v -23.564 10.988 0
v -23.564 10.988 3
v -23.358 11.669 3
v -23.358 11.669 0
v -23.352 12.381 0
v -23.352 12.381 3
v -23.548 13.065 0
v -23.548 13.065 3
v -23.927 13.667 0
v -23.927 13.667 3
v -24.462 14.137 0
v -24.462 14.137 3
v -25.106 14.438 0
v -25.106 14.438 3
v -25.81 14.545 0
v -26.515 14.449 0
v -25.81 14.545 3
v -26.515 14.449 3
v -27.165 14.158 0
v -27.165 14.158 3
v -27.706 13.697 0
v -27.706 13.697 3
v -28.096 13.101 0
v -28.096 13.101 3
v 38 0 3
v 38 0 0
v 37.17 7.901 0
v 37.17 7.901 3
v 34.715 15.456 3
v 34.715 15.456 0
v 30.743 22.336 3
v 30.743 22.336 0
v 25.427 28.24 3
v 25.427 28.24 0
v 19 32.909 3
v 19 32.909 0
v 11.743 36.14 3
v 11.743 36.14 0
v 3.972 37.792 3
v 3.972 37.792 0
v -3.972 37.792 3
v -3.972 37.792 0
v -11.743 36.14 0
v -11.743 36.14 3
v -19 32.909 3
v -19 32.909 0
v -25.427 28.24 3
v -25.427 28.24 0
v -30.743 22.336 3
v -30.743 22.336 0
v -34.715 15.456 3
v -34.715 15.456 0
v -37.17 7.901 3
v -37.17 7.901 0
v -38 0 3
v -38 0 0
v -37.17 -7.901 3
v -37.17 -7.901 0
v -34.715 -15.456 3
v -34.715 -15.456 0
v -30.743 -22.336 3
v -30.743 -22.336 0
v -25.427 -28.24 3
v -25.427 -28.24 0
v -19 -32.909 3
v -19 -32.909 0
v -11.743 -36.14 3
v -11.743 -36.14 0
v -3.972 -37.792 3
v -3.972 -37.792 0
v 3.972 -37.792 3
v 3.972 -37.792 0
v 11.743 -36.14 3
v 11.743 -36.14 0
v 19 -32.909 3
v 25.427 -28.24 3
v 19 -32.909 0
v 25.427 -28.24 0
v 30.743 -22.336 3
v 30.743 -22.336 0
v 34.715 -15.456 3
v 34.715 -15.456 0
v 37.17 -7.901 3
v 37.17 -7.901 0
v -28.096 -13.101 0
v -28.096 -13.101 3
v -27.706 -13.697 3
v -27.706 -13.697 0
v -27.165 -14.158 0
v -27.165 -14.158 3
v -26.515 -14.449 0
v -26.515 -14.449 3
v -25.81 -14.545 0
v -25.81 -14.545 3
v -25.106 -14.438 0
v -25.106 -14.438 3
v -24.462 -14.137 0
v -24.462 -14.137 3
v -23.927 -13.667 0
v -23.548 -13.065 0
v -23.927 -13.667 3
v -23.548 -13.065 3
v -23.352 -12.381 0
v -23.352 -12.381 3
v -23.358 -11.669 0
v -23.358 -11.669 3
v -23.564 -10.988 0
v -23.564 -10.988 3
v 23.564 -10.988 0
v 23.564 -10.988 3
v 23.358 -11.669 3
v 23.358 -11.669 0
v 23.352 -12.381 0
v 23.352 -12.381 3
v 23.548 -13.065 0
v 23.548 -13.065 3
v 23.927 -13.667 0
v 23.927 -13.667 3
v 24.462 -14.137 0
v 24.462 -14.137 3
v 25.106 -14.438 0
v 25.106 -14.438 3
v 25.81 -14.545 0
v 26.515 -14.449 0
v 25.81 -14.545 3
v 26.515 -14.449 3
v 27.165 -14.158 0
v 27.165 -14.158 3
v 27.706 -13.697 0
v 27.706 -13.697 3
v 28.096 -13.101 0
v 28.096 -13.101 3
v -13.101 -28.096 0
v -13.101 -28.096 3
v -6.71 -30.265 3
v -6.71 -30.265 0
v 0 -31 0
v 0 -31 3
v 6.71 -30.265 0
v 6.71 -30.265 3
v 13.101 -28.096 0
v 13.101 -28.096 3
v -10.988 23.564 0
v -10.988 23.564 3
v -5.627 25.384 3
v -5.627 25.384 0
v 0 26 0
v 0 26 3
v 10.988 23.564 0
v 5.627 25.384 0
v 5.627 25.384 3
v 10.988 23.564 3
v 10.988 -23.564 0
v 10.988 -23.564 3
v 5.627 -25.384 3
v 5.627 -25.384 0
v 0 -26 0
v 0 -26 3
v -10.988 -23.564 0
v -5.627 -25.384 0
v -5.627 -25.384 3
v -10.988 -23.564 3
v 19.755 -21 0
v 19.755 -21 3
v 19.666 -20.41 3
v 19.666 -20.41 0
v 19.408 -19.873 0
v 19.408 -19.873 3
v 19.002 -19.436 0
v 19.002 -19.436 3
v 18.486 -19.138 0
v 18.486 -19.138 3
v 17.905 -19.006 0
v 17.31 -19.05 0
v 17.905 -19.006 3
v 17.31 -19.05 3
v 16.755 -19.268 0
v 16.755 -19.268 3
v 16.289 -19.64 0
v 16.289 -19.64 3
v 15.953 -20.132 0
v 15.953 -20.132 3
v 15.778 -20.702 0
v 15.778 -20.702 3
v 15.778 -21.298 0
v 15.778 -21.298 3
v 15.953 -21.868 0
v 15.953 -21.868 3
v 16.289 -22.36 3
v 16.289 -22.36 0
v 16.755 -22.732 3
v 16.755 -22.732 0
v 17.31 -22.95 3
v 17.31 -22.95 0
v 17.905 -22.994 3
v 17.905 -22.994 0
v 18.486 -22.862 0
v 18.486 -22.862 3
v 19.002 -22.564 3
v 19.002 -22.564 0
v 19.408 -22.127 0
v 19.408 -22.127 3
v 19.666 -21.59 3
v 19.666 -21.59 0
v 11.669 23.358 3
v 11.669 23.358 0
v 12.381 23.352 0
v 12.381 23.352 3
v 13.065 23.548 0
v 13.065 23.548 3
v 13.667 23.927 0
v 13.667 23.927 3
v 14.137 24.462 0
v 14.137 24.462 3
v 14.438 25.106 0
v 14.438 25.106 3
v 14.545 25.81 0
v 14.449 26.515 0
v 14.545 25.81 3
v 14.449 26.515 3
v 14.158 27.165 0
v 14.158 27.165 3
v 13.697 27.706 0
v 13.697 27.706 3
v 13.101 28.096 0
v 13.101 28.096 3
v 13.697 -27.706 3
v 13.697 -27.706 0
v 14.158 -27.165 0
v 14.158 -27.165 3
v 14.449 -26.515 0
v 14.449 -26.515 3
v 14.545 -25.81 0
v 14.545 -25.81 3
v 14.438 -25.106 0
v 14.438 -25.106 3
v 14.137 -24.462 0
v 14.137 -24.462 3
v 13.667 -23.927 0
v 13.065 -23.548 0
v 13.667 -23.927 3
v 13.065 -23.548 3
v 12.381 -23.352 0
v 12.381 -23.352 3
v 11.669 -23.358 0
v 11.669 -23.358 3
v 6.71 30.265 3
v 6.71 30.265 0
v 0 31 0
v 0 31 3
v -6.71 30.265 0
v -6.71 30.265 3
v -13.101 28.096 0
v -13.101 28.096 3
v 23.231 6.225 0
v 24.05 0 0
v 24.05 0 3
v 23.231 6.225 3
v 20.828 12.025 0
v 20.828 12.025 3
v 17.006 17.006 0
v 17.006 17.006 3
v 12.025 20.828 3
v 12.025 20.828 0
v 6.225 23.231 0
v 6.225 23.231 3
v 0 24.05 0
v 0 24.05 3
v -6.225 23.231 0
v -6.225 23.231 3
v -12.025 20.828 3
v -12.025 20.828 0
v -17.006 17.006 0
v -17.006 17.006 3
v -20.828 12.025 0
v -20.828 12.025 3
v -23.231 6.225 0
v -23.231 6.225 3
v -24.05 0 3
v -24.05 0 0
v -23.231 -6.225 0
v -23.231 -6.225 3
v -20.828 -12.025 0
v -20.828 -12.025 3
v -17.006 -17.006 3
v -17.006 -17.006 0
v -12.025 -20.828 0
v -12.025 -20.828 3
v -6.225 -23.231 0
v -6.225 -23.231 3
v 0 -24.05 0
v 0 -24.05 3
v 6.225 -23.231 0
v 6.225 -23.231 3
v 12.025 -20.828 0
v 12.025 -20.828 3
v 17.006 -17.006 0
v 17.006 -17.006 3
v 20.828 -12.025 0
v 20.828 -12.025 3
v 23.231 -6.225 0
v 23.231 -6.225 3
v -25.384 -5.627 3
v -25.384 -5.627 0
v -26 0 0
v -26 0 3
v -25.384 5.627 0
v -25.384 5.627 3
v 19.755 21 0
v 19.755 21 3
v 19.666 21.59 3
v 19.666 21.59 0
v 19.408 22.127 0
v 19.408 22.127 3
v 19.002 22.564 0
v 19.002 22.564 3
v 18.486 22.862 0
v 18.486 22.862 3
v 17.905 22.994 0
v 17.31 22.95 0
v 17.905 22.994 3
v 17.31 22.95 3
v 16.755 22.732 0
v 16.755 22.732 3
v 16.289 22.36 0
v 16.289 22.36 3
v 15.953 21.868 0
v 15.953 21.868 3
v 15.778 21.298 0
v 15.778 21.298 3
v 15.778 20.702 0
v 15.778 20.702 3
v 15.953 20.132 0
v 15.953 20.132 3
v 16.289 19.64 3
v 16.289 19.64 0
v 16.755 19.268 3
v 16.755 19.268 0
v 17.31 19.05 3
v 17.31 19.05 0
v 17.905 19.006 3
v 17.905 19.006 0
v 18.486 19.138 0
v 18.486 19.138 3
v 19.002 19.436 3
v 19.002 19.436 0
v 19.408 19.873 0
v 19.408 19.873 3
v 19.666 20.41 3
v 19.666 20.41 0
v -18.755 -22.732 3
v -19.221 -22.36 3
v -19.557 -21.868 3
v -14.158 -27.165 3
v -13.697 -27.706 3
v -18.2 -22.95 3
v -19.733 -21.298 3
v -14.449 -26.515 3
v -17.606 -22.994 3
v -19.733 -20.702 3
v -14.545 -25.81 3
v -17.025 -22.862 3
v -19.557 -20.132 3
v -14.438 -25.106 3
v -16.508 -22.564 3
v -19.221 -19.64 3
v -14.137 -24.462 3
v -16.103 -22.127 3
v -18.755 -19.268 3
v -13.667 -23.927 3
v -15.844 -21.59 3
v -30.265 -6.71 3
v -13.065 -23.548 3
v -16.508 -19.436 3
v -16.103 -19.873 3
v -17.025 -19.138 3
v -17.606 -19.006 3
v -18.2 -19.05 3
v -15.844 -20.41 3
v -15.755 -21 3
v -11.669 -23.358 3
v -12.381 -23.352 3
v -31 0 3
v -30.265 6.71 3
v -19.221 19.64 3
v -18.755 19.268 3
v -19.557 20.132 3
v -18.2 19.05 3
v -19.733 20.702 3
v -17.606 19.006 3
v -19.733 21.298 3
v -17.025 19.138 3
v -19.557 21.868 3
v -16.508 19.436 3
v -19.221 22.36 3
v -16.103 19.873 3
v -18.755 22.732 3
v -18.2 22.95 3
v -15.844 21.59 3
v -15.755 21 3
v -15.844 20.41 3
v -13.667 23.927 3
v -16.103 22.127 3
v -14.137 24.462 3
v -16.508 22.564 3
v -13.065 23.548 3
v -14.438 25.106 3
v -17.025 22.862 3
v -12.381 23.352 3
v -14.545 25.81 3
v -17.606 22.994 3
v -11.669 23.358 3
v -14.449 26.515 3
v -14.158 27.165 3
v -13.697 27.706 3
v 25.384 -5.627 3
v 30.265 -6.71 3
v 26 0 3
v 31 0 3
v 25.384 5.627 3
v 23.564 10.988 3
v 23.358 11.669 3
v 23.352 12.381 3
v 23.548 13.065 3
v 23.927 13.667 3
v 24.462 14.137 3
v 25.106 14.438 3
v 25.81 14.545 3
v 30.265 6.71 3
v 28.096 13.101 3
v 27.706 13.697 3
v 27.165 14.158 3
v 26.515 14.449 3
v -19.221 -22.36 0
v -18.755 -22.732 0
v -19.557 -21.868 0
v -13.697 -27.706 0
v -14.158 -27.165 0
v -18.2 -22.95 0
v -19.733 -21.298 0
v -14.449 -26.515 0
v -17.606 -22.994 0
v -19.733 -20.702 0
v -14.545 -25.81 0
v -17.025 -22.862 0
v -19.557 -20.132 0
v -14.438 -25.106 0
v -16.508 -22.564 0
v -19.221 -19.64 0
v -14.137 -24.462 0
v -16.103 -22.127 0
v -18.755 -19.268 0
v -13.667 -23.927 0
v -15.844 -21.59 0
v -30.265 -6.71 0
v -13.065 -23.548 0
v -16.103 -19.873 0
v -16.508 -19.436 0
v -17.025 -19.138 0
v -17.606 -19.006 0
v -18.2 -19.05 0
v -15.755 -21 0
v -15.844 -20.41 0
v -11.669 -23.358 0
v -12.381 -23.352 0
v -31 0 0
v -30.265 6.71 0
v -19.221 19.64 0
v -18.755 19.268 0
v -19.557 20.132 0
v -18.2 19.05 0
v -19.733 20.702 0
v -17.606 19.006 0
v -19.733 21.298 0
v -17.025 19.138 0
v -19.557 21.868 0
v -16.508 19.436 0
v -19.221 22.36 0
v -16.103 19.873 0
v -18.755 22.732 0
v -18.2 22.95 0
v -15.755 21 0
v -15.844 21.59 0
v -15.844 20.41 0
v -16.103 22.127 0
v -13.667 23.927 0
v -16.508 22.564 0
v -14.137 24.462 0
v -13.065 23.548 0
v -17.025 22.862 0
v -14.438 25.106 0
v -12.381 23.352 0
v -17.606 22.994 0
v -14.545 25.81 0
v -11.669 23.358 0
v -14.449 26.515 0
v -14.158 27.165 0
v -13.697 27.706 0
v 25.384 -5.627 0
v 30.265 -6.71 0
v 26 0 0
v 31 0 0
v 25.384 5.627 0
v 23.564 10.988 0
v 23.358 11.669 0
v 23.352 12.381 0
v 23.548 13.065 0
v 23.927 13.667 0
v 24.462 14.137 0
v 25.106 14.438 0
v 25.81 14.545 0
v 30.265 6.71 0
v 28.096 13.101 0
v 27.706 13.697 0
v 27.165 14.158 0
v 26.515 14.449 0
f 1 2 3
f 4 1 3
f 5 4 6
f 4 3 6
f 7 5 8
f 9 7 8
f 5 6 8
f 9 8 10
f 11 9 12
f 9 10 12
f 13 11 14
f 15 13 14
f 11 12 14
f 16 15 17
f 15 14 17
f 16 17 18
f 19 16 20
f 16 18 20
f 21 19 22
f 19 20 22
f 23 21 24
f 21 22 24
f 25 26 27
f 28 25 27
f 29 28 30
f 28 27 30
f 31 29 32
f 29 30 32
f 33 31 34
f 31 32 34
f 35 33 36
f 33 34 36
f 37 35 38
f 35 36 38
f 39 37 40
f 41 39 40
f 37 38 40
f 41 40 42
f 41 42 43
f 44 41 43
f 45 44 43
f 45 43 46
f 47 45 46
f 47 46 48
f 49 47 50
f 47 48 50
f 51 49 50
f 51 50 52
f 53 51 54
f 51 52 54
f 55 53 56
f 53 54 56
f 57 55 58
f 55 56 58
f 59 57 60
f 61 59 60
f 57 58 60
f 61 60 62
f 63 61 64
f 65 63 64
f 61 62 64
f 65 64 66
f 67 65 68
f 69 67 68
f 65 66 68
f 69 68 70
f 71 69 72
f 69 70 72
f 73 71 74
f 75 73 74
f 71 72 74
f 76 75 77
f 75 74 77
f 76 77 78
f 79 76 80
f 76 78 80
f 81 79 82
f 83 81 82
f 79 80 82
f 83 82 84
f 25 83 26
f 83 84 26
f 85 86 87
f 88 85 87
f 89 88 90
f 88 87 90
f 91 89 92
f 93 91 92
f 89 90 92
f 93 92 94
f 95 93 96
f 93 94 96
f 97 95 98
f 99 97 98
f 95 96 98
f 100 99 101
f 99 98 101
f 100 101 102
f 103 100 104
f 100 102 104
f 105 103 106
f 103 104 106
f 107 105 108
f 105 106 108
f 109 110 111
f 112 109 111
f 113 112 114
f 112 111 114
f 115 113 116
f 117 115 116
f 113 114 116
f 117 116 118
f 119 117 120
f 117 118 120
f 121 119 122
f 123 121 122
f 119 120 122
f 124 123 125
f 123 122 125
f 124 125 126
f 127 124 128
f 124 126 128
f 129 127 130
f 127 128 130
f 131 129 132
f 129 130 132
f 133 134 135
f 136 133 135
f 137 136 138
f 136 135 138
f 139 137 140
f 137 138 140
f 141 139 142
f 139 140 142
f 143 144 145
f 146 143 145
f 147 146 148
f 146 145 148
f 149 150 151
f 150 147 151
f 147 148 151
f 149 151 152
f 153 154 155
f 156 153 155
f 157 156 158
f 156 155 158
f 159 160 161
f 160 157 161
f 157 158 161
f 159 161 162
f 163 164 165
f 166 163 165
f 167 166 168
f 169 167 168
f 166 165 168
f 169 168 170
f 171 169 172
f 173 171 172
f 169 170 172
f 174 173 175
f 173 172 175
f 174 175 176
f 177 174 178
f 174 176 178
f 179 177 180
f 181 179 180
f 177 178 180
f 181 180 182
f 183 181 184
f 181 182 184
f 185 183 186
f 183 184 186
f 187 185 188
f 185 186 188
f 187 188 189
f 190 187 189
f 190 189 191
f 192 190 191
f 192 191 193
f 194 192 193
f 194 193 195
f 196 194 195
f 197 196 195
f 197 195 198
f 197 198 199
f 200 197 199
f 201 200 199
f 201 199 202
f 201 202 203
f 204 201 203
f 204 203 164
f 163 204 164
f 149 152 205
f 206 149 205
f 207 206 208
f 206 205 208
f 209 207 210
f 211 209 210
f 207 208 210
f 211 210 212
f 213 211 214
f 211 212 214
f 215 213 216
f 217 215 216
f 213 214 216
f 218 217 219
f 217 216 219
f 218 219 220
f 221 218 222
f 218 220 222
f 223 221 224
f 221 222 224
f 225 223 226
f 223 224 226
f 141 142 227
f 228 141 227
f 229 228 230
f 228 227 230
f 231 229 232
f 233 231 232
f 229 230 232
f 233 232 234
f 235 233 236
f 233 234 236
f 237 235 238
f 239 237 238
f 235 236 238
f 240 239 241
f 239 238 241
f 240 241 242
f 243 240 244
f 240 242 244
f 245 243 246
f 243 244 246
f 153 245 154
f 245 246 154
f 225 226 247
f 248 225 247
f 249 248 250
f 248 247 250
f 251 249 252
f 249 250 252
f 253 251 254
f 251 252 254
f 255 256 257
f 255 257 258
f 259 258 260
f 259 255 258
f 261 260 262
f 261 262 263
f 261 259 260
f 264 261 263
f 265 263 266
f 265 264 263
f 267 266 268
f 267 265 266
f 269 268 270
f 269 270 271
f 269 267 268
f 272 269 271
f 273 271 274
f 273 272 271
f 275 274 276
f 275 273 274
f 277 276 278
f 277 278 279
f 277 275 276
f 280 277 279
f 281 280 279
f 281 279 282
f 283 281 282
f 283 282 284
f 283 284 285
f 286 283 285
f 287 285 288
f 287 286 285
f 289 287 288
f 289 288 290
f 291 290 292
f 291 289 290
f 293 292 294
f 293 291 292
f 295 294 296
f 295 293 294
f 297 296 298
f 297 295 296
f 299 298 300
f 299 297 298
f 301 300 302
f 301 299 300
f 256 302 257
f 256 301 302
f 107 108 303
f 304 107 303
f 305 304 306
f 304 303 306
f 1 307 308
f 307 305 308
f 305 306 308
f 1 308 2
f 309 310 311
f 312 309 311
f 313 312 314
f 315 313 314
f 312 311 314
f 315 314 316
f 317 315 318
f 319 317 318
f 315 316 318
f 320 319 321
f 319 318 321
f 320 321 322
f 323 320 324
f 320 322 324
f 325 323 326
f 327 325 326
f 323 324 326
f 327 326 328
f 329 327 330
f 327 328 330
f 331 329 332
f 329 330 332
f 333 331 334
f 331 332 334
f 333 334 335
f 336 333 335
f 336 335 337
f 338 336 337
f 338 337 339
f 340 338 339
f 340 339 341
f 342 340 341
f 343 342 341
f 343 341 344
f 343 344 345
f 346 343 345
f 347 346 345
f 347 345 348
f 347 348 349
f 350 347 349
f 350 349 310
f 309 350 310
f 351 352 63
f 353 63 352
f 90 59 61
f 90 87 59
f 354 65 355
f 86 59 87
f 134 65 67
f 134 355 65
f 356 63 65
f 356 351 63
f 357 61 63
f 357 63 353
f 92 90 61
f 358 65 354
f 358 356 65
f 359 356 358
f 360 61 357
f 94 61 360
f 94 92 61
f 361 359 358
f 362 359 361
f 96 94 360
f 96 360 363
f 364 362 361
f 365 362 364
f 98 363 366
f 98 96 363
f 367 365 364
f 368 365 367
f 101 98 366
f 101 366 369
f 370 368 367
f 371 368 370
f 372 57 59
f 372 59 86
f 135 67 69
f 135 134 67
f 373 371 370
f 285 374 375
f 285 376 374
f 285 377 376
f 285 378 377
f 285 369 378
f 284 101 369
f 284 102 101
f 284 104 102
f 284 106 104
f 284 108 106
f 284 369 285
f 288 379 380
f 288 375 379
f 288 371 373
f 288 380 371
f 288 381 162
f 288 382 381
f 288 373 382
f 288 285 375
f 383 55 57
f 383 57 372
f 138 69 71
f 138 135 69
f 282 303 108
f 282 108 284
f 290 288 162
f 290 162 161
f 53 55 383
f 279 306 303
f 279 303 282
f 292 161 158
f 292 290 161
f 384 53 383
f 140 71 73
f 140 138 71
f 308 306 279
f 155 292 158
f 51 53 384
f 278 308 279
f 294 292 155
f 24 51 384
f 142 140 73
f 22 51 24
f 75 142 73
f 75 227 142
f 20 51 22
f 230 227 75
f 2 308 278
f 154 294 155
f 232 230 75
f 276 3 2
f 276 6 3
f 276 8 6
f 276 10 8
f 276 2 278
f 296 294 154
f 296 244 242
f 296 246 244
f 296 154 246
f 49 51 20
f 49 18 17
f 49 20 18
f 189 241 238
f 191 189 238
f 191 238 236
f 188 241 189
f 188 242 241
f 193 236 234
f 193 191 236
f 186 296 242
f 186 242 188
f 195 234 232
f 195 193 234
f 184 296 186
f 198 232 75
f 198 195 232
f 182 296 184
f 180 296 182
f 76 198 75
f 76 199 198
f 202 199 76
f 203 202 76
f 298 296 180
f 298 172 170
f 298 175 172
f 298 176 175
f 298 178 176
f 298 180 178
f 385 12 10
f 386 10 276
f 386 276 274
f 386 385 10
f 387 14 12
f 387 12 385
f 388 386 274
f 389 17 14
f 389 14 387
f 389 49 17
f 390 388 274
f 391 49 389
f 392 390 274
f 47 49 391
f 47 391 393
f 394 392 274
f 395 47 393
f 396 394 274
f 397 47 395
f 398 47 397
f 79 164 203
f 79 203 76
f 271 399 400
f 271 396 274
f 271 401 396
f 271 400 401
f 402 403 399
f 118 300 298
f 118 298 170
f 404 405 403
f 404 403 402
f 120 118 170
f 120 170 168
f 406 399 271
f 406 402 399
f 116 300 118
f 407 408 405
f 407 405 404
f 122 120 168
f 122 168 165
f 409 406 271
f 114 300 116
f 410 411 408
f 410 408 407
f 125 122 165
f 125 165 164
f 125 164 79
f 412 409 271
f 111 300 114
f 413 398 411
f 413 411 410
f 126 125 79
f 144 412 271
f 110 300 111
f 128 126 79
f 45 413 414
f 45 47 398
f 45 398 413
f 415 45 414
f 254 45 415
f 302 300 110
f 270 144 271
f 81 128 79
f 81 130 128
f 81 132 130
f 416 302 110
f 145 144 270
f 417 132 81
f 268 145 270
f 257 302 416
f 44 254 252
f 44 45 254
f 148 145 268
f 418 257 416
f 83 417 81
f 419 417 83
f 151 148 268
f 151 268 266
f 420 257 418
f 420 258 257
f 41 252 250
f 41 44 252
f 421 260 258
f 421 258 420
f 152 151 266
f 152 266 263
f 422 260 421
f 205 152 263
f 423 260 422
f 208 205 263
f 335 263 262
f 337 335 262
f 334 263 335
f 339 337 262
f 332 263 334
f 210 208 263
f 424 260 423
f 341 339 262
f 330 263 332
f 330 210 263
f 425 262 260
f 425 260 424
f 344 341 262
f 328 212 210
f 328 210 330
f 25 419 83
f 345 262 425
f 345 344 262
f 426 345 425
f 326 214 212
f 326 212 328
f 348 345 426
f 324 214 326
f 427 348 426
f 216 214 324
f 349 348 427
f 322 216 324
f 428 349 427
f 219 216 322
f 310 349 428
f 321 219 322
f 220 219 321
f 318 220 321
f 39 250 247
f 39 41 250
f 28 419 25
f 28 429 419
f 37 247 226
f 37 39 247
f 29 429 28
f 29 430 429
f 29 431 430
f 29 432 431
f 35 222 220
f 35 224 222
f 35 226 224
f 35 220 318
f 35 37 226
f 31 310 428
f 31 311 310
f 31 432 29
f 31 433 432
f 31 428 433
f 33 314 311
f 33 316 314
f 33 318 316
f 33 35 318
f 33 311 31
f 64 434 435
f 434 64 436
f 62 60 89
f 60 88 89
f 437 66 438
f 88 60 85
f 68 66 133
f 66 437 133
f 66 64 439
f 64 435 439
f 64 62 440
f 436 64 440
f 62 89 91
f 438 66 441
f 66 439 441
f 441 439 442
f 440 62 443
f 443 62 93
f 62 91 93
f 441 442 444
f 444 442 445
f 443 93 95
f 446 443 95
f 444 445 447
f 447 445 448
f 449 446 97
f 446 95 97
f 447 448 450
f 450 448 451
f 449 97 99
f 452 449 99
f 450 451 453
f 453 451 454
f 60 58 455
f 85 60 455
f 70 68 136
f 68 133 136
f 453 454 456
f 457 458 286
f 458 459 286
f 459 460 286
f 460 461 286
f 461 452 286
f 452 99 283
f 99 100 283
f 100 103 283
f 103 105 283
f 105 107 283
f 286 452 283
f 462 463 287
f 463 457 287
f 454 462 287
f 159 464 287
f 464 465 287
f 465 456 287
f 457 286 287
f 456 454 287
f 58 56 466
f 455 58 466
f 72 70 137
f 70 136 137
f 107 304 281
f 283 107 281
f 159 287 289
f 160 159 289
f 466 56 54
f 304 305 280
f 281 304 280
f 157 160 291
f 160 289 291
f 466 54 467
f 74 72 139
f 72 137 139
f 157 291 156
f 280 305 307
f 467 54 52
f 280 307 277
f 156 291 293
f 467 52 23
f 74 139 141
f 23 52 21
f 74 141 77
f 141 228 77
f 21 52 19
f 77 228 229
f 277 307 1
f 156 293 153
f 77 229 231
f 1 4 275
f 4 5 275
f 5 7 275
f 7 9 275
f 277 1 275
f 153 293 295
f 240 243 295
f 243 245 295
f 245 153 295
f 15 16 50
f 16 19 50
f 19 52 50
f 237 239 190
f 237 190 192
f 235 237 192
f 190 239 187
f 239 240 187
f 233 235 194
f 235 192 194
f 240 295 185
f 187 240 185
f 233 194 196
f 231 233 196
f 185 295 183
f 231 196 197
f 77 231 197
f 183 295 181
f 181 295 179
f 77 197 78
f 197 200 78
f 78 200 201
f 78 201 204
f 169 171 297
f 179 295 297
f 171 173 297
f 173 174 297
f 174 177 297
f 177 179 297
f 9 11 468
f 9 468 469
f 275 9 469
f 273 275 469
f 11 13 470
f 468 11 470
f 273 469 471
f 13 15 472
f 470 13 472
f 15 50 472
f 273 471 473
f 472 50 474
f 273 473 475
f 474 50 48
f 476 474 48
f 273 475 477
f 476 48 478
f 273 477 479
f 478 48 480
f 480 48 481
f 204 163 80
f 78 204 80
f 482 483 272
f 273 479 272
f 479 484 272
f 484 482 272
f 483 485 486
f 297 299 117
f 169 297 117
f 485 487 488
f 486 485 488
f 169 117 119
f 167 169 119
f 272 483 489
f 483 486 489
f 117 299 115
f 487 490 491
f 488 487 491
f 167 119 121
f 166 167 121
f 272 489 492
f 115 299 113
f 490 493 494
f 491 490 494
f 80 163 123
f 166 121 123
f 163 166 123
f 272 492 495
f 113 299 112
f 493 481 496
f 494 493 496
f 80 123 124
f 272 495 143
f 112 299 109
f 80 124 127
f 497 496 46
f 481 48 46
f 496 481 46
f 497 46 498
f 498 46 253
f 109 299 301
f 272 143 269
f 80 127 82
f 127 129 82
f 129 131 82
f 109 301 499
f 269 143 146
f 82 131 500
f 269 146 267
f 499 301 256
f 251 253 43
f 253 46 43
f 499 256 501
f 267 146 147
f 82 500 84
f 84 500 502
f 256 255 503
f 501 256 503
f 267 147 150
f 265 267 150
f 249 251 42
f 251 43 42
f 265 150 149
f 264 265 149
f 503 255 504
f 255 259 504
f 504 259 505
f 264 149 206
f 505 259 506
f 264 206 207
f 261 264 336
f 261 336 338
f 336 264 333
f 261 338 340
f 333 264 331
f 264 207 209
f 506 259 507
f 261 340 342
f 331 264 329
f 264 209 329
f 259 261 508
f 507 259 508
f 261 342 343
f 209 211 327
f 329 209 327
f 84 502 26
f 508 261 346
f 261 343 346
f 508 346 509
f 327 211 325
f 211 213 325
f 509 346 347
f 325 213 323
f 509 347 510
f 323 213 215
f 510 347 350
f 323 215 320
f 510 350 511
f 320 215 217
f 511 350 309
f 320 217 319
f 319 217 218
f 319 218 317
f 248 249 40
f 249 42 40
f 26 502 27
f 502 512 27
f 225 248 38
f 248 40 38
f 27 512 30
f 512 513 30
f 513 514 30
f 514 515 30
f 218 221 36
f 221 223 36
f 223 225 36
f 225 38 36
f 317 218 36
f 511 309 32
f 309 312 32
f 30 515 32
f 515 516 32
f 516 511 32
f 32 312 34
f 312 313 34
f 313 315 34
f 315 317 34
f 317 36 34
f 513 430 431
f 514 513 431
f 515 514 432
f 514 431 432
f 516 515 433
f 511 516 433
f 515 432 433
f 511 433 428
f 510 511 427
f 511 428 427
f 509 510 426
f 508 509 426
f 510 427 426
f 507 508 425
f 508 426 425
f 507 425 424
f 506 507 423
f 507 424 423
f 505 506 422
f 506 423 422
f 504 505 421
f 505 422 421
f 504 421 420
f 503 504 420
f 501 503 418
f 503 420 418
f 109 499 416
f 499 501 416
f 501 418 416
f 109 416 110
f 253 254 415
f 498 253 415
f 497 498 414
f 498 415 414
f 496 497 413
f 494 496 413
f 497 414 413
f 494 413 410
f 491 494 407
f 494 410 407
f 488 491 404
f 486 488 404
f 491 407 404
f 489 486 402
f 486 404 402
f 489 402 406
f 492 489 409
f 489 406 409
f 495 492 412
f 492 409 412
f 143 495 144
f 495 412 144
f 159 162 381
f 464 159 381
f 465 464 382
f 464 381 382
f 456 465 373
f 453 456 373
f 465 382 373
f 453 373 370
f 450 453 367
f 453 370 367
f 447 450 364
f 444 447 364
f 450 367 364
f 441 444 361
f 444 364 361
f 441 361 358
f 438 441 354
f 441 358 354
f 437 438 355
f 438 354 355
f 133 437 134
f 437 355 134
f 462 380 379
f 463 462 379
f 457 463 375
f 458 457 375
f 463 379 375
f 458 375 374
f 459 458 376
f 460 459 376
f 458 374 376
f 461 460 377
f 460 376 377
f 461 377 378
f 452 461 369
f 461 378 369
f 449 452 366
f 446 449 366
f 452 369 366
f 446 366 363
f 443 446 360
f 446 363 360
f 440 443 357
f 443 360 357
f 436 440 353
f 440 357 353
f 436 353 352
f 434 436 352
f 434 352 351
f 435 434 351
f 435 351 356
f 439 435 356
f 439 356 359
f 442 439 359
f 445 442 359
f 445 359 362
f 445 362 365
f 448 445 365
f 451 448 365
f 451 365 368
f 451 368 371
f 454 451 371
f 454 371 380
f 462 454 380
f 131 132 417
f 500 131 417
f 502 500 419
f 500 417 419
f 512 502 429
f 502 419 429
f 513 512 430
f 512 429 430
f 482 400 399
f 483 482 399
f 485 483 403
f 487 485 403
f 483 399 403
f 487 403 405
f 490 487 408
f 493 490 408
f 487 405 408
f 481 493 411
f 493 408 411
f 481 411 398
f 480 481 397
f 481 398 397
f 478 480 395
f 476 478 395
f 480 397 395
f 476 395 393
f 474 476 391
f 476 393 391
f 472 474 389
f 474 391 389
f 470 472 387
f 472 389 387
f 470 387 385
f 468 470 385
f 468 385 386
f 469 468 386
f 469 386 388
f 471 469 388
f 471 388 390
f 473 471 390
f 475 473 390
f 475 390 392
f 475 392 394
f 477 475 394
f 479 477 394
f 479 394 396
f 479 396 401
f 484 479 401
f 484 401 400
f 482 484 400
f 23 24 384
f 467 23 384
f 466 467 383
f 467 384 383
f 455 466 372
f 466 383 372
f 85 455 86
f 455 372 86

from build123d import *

# Parameters (mm, degrees)
SKETCH_1_R          = 38
SKETCH_1_R_2        = 24.05
EXTRUDE_1_DEPTH     = 3
SKETCH_3_R          = 2
CUT_EXTRUDE_1_DEPTH = 10
CUT_EXTRUDE_2_DEPTH = 10


with BuildPart() as part:
    # 草图1 → 凸台-拉伸1 (new body)
    with BuildSketch(Plane.XY):
        Circle(SKETCH_1_R)
        Circle(SKETCH_1_R_2, mode=Mode.SUBTRACT)
    extrude(amount=EXTRUDE_1_DEPTH)

    # 草图3 → 切除-拉伸1 (cut)
    with BuildSketch(Plane.XY.offset(3)):
        with Locations((17.755280905, -21)):
            Circle(SKETCH_3_R)
        with Locations((17.755280905, 21)):
            Circle(SKETCH_3_R)
        with Locations((-17.755280905, -21)):
            Circle(SKETCH_3_R)
        with Locations((-17.755280905, 21)):
            Circle(SKETCH_3_R)
    extrude(amount=-CUT_EXTRUDE_1_DEPTH, mode=Mode.SUBTRACT)

    # 草图4 → 切除-拉伸2 (cut)
    with BuildSketch(Plane.XY.offset(3)):
        with BuildLine():
            ThreePointArc((28.095541398, -13.101166114), (31, 0), (28.095541398, 13.101166114))
            ThreePointArc((28.095541398, 13.101166114), (24.773226276, 14.310389927), (23.564002463, 10.988074805))
            ThreePointArc((23.564002463, 10.988074805), (26, 0), (23.564002463, -10.988074805))
            ThreePointArc((23.564002463, -10.988074805), (24.773226276, -14.310389927), (28.095541398, -13.101166114))
        make_face()
        with BuildLine():
            ThreePointArc((-13.101166114, -28.095541398), (0, -31), (13.101166114, -28.095541398))
            ThreePointArc((13.101166114, -28.095541398), (14.310389927, -24.773226276), (10.988074805, -23.564002463))
            ThreePointArc((10.988074805, -23.564002463), (0, -26), (-10.988074805, -23.564002463))
            ThreePointArc((-10.988074805, -23.564002463), (-14.310389927, -24.773226276), (-13.101166114, -28.095541398))
        make_face()
        with BuildLine():
            ThreePointArc((-28.095541398, 13.101166114), (-31, 0), (-28.095541398, -13.101166114))
            ThreePointArc((-28.095541398, -13.101166114), (-24.773226276, -14.310389927), (-23.564002463, -10.988074805))
            ThreePointArc((-23.564002463, -10.988074805), (-26, 0), (-23.564002463, 10.988074805))
            ThreePointArc((-23.564002463, 10.988074805), (-24.773226276, 14.310389927), (-28.095541398, 13.101166114))
        make_face()
        with BuildLine():
            ThreePointArc((13.101166114, 28.095541398), (0, 31), (-13.101166114, 28.095541398))
            ThreePointArc((-13.101166114, 28.095541398), (-14.310389927, 24.773226276), (-10.988074805, 23.564002463))
            ThreePointArc((-10.988074805, 23.564002463), (0, 26), (10.988074805, 23.564002463))
            ThreePointArc((10.988074805, 23.564002463), (14.310389927, 24.773226276), (13.101166114, 28.095541398))
        make_face()
    extrude(amount=-CUT_EXTRUDE_2_DEPTH, mode=Mode.SUBTRACT)


solid = part.part
